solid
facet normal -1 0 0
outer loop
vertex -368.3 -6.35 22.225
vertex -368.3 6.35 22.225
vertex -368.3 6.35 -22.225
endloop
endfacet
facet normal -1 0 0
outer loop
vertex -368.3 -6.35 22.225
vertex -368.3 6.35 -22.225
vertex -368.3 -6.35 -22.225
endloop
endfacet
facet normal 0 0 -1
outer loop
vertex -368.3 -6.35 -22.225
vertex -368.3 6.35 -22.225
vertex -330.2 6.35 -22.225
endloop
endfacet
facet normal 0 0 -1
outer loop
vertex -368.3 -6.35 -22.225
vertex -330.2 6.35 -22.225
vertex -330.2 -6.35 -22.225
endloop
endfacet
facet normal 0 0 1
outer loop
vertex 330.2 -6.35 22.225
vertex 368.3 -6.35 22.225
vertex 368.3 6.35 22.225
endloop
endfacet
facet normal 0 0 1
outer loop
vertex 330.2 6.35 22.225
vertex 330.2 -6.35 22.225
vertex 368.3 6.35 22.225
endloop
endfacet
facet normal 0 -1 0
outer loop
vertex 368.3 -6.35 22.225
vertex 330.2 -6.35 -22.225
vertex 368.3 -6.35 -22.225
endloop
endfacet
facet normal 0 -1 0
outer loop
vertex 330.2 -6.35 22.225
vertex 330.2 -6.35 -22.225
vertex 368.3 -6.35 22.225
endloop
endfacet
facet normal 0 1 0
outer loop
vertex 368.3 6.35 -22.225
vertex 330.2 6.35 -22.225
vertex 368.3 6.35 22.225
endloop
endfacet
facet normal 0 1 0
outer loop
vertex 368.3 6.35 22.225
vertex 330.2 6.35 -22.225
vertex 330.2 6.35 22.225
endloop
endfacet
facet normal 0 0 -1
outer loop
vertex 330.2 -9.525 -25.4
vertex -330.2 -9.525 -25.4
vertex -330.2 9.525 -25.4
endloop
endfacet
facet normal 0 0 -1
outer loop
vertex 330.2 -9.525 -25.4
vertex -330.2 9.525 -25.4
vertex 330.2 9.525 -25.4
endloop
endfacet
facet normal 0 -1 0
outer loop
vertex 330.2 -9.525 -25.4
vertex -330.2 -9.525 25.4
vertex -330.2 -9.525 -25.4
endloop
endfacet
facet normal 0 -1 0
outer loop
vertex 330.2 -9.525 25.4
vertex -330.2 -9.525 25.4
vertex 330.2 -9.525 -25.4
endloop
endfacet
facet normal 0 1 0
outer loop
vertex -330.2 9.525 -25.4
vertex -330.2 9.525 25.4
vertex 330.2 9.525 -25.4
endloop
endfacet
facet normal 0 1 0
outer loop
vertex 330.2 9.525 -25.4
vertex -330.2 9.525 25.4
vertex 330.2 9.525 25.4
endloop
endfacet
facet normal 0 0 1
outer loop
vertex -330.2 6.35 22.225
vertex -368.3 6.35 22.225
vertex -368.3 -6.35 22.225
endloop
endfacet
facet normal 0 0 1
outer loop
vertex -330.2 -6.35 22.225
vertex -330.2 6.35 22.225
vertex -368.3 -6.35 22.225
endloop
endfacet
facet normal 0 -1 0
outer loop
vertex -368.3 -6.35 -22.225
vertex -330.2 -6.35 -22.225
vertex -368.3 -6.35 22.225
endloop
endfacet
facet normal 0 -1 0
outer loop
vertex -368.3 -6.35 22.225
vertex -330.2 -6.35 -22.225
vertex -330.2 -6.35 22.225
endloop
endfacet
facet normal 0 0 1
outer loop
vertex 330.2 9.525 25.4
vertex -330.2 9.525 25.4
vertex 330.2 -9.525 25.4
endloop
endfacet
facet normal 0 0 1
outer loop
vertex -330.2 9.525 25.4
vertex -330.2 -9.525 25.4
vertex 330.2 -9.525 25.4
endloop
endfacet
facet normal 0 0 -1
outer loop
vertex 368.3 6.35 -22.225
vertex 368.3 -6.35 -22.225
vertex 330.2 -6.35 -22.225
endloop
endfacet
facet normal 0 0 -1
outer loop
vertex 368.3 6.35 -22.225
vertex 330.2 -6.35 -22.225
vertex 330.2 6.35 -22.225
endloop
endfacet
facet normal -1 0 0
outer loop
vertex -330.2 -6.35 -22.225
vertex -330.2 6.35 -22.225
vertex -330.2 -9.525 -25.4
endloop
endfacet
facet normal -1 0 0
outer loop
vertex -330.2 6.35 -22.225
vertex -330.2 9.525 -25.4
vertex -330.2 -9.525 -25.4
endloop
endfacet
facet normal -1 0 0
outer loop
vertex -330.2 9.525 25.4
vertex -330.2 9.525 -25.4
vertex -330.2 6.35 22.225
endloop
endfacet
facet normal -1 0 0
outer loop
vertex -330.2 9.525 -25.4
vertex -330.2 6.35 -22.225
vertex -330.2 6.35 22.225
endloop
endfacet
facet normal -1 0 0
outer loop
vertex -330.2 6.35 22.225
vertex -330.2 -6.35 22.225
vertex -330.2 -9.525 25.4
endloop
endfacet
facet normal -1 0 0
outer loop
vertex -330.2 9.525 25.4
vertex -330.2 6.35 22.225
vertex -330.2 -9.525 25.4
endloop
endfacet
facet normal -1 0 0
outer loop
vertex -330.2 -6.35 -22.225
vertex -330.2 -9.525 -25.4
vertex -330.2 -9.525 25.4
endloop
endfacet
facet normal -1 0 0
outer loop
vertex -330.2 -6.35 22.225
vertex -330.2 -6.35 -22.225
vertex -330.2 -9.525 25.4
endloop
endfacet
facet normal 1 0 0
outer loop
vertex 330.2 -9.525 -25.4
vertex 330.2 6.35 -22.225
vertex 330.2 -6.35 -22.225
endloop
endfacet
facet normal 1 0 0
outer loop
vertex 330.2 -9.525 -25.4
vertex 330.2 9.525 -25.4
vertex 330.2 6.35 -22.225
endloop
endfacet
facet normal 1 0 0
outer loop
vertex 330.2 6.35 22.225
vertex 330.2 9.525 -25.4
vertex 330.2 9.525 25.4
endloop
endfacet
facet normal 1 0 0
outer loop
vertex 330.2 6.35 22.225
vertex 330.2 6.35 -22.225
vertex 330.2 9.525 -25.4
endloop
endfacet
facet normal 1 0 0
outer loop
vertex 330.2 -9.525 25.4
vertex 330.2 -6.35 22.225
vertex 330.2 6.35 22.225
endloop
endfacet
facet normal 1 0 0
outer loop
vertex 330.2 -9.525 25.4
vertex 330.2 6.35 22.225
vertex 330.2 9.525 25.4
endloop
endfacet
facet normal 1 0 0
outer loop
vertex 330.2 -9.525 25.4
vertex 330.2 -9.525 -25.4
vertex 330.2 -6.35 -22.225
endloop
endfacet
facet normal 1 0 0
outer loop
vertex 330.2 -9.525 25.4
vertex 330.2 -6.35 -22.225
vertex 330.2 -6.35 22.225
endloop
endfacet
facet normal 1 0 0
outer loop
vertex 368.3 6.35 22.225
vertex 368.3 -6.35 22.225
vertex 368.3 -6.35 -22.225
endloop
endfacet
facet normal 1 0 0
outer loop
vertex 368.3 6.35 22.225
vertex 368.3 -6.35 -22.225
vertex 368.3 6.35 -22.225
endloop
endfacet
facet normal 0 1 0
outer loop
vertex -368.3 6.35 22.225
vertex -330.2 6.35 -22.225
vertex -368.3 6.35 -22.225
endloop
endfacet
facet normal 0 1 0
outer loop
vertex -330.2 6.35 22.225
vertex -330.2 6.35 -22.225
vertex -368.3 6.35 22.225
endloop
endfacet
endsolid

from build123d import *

# Parameters (mm, degrees)
F0_W     = 660.4
F0_H     = 50.8
F1_DEPTH = 9.525
F2_W     = 12.7
F2_H     = 44.45
F3_W     = 12.7
F3_H     = 44.45
F4_DEPTH = 38.1
F5_DEPTH = 38.1


with BuildPart() as f1:
    # F0 (on Front) → F1 (new body, symmetric)
    with BuildSketch(Plane.XZ):
        Rectangle(F0_W, F0_H)
    extrude(amount=F1_DEPTH, both=True)

    # F2 (on face) + F3 (on face) → F4 (join)
    with BuildSketch(Plane(origin=(-330.2, 0, 0), x_dir=(0, -1, 0), z_dir=(-1, 0, 0))):
        Rectangle(F2_W, F2_H)
    with BuildSketch(Plane.YZ.offset(330.2)):
        Rectangle(F3_W, F3_H)
    extrude(amount=F4_DEPTH)

    # F3 (on face) → F5 (join)
    with BuildSketch(Plane.YZ.offset(330.2)):
        Rectangle(F3_W, F3_H)
    extrude(amount=F5_DEPTH)


solid = f1.part
